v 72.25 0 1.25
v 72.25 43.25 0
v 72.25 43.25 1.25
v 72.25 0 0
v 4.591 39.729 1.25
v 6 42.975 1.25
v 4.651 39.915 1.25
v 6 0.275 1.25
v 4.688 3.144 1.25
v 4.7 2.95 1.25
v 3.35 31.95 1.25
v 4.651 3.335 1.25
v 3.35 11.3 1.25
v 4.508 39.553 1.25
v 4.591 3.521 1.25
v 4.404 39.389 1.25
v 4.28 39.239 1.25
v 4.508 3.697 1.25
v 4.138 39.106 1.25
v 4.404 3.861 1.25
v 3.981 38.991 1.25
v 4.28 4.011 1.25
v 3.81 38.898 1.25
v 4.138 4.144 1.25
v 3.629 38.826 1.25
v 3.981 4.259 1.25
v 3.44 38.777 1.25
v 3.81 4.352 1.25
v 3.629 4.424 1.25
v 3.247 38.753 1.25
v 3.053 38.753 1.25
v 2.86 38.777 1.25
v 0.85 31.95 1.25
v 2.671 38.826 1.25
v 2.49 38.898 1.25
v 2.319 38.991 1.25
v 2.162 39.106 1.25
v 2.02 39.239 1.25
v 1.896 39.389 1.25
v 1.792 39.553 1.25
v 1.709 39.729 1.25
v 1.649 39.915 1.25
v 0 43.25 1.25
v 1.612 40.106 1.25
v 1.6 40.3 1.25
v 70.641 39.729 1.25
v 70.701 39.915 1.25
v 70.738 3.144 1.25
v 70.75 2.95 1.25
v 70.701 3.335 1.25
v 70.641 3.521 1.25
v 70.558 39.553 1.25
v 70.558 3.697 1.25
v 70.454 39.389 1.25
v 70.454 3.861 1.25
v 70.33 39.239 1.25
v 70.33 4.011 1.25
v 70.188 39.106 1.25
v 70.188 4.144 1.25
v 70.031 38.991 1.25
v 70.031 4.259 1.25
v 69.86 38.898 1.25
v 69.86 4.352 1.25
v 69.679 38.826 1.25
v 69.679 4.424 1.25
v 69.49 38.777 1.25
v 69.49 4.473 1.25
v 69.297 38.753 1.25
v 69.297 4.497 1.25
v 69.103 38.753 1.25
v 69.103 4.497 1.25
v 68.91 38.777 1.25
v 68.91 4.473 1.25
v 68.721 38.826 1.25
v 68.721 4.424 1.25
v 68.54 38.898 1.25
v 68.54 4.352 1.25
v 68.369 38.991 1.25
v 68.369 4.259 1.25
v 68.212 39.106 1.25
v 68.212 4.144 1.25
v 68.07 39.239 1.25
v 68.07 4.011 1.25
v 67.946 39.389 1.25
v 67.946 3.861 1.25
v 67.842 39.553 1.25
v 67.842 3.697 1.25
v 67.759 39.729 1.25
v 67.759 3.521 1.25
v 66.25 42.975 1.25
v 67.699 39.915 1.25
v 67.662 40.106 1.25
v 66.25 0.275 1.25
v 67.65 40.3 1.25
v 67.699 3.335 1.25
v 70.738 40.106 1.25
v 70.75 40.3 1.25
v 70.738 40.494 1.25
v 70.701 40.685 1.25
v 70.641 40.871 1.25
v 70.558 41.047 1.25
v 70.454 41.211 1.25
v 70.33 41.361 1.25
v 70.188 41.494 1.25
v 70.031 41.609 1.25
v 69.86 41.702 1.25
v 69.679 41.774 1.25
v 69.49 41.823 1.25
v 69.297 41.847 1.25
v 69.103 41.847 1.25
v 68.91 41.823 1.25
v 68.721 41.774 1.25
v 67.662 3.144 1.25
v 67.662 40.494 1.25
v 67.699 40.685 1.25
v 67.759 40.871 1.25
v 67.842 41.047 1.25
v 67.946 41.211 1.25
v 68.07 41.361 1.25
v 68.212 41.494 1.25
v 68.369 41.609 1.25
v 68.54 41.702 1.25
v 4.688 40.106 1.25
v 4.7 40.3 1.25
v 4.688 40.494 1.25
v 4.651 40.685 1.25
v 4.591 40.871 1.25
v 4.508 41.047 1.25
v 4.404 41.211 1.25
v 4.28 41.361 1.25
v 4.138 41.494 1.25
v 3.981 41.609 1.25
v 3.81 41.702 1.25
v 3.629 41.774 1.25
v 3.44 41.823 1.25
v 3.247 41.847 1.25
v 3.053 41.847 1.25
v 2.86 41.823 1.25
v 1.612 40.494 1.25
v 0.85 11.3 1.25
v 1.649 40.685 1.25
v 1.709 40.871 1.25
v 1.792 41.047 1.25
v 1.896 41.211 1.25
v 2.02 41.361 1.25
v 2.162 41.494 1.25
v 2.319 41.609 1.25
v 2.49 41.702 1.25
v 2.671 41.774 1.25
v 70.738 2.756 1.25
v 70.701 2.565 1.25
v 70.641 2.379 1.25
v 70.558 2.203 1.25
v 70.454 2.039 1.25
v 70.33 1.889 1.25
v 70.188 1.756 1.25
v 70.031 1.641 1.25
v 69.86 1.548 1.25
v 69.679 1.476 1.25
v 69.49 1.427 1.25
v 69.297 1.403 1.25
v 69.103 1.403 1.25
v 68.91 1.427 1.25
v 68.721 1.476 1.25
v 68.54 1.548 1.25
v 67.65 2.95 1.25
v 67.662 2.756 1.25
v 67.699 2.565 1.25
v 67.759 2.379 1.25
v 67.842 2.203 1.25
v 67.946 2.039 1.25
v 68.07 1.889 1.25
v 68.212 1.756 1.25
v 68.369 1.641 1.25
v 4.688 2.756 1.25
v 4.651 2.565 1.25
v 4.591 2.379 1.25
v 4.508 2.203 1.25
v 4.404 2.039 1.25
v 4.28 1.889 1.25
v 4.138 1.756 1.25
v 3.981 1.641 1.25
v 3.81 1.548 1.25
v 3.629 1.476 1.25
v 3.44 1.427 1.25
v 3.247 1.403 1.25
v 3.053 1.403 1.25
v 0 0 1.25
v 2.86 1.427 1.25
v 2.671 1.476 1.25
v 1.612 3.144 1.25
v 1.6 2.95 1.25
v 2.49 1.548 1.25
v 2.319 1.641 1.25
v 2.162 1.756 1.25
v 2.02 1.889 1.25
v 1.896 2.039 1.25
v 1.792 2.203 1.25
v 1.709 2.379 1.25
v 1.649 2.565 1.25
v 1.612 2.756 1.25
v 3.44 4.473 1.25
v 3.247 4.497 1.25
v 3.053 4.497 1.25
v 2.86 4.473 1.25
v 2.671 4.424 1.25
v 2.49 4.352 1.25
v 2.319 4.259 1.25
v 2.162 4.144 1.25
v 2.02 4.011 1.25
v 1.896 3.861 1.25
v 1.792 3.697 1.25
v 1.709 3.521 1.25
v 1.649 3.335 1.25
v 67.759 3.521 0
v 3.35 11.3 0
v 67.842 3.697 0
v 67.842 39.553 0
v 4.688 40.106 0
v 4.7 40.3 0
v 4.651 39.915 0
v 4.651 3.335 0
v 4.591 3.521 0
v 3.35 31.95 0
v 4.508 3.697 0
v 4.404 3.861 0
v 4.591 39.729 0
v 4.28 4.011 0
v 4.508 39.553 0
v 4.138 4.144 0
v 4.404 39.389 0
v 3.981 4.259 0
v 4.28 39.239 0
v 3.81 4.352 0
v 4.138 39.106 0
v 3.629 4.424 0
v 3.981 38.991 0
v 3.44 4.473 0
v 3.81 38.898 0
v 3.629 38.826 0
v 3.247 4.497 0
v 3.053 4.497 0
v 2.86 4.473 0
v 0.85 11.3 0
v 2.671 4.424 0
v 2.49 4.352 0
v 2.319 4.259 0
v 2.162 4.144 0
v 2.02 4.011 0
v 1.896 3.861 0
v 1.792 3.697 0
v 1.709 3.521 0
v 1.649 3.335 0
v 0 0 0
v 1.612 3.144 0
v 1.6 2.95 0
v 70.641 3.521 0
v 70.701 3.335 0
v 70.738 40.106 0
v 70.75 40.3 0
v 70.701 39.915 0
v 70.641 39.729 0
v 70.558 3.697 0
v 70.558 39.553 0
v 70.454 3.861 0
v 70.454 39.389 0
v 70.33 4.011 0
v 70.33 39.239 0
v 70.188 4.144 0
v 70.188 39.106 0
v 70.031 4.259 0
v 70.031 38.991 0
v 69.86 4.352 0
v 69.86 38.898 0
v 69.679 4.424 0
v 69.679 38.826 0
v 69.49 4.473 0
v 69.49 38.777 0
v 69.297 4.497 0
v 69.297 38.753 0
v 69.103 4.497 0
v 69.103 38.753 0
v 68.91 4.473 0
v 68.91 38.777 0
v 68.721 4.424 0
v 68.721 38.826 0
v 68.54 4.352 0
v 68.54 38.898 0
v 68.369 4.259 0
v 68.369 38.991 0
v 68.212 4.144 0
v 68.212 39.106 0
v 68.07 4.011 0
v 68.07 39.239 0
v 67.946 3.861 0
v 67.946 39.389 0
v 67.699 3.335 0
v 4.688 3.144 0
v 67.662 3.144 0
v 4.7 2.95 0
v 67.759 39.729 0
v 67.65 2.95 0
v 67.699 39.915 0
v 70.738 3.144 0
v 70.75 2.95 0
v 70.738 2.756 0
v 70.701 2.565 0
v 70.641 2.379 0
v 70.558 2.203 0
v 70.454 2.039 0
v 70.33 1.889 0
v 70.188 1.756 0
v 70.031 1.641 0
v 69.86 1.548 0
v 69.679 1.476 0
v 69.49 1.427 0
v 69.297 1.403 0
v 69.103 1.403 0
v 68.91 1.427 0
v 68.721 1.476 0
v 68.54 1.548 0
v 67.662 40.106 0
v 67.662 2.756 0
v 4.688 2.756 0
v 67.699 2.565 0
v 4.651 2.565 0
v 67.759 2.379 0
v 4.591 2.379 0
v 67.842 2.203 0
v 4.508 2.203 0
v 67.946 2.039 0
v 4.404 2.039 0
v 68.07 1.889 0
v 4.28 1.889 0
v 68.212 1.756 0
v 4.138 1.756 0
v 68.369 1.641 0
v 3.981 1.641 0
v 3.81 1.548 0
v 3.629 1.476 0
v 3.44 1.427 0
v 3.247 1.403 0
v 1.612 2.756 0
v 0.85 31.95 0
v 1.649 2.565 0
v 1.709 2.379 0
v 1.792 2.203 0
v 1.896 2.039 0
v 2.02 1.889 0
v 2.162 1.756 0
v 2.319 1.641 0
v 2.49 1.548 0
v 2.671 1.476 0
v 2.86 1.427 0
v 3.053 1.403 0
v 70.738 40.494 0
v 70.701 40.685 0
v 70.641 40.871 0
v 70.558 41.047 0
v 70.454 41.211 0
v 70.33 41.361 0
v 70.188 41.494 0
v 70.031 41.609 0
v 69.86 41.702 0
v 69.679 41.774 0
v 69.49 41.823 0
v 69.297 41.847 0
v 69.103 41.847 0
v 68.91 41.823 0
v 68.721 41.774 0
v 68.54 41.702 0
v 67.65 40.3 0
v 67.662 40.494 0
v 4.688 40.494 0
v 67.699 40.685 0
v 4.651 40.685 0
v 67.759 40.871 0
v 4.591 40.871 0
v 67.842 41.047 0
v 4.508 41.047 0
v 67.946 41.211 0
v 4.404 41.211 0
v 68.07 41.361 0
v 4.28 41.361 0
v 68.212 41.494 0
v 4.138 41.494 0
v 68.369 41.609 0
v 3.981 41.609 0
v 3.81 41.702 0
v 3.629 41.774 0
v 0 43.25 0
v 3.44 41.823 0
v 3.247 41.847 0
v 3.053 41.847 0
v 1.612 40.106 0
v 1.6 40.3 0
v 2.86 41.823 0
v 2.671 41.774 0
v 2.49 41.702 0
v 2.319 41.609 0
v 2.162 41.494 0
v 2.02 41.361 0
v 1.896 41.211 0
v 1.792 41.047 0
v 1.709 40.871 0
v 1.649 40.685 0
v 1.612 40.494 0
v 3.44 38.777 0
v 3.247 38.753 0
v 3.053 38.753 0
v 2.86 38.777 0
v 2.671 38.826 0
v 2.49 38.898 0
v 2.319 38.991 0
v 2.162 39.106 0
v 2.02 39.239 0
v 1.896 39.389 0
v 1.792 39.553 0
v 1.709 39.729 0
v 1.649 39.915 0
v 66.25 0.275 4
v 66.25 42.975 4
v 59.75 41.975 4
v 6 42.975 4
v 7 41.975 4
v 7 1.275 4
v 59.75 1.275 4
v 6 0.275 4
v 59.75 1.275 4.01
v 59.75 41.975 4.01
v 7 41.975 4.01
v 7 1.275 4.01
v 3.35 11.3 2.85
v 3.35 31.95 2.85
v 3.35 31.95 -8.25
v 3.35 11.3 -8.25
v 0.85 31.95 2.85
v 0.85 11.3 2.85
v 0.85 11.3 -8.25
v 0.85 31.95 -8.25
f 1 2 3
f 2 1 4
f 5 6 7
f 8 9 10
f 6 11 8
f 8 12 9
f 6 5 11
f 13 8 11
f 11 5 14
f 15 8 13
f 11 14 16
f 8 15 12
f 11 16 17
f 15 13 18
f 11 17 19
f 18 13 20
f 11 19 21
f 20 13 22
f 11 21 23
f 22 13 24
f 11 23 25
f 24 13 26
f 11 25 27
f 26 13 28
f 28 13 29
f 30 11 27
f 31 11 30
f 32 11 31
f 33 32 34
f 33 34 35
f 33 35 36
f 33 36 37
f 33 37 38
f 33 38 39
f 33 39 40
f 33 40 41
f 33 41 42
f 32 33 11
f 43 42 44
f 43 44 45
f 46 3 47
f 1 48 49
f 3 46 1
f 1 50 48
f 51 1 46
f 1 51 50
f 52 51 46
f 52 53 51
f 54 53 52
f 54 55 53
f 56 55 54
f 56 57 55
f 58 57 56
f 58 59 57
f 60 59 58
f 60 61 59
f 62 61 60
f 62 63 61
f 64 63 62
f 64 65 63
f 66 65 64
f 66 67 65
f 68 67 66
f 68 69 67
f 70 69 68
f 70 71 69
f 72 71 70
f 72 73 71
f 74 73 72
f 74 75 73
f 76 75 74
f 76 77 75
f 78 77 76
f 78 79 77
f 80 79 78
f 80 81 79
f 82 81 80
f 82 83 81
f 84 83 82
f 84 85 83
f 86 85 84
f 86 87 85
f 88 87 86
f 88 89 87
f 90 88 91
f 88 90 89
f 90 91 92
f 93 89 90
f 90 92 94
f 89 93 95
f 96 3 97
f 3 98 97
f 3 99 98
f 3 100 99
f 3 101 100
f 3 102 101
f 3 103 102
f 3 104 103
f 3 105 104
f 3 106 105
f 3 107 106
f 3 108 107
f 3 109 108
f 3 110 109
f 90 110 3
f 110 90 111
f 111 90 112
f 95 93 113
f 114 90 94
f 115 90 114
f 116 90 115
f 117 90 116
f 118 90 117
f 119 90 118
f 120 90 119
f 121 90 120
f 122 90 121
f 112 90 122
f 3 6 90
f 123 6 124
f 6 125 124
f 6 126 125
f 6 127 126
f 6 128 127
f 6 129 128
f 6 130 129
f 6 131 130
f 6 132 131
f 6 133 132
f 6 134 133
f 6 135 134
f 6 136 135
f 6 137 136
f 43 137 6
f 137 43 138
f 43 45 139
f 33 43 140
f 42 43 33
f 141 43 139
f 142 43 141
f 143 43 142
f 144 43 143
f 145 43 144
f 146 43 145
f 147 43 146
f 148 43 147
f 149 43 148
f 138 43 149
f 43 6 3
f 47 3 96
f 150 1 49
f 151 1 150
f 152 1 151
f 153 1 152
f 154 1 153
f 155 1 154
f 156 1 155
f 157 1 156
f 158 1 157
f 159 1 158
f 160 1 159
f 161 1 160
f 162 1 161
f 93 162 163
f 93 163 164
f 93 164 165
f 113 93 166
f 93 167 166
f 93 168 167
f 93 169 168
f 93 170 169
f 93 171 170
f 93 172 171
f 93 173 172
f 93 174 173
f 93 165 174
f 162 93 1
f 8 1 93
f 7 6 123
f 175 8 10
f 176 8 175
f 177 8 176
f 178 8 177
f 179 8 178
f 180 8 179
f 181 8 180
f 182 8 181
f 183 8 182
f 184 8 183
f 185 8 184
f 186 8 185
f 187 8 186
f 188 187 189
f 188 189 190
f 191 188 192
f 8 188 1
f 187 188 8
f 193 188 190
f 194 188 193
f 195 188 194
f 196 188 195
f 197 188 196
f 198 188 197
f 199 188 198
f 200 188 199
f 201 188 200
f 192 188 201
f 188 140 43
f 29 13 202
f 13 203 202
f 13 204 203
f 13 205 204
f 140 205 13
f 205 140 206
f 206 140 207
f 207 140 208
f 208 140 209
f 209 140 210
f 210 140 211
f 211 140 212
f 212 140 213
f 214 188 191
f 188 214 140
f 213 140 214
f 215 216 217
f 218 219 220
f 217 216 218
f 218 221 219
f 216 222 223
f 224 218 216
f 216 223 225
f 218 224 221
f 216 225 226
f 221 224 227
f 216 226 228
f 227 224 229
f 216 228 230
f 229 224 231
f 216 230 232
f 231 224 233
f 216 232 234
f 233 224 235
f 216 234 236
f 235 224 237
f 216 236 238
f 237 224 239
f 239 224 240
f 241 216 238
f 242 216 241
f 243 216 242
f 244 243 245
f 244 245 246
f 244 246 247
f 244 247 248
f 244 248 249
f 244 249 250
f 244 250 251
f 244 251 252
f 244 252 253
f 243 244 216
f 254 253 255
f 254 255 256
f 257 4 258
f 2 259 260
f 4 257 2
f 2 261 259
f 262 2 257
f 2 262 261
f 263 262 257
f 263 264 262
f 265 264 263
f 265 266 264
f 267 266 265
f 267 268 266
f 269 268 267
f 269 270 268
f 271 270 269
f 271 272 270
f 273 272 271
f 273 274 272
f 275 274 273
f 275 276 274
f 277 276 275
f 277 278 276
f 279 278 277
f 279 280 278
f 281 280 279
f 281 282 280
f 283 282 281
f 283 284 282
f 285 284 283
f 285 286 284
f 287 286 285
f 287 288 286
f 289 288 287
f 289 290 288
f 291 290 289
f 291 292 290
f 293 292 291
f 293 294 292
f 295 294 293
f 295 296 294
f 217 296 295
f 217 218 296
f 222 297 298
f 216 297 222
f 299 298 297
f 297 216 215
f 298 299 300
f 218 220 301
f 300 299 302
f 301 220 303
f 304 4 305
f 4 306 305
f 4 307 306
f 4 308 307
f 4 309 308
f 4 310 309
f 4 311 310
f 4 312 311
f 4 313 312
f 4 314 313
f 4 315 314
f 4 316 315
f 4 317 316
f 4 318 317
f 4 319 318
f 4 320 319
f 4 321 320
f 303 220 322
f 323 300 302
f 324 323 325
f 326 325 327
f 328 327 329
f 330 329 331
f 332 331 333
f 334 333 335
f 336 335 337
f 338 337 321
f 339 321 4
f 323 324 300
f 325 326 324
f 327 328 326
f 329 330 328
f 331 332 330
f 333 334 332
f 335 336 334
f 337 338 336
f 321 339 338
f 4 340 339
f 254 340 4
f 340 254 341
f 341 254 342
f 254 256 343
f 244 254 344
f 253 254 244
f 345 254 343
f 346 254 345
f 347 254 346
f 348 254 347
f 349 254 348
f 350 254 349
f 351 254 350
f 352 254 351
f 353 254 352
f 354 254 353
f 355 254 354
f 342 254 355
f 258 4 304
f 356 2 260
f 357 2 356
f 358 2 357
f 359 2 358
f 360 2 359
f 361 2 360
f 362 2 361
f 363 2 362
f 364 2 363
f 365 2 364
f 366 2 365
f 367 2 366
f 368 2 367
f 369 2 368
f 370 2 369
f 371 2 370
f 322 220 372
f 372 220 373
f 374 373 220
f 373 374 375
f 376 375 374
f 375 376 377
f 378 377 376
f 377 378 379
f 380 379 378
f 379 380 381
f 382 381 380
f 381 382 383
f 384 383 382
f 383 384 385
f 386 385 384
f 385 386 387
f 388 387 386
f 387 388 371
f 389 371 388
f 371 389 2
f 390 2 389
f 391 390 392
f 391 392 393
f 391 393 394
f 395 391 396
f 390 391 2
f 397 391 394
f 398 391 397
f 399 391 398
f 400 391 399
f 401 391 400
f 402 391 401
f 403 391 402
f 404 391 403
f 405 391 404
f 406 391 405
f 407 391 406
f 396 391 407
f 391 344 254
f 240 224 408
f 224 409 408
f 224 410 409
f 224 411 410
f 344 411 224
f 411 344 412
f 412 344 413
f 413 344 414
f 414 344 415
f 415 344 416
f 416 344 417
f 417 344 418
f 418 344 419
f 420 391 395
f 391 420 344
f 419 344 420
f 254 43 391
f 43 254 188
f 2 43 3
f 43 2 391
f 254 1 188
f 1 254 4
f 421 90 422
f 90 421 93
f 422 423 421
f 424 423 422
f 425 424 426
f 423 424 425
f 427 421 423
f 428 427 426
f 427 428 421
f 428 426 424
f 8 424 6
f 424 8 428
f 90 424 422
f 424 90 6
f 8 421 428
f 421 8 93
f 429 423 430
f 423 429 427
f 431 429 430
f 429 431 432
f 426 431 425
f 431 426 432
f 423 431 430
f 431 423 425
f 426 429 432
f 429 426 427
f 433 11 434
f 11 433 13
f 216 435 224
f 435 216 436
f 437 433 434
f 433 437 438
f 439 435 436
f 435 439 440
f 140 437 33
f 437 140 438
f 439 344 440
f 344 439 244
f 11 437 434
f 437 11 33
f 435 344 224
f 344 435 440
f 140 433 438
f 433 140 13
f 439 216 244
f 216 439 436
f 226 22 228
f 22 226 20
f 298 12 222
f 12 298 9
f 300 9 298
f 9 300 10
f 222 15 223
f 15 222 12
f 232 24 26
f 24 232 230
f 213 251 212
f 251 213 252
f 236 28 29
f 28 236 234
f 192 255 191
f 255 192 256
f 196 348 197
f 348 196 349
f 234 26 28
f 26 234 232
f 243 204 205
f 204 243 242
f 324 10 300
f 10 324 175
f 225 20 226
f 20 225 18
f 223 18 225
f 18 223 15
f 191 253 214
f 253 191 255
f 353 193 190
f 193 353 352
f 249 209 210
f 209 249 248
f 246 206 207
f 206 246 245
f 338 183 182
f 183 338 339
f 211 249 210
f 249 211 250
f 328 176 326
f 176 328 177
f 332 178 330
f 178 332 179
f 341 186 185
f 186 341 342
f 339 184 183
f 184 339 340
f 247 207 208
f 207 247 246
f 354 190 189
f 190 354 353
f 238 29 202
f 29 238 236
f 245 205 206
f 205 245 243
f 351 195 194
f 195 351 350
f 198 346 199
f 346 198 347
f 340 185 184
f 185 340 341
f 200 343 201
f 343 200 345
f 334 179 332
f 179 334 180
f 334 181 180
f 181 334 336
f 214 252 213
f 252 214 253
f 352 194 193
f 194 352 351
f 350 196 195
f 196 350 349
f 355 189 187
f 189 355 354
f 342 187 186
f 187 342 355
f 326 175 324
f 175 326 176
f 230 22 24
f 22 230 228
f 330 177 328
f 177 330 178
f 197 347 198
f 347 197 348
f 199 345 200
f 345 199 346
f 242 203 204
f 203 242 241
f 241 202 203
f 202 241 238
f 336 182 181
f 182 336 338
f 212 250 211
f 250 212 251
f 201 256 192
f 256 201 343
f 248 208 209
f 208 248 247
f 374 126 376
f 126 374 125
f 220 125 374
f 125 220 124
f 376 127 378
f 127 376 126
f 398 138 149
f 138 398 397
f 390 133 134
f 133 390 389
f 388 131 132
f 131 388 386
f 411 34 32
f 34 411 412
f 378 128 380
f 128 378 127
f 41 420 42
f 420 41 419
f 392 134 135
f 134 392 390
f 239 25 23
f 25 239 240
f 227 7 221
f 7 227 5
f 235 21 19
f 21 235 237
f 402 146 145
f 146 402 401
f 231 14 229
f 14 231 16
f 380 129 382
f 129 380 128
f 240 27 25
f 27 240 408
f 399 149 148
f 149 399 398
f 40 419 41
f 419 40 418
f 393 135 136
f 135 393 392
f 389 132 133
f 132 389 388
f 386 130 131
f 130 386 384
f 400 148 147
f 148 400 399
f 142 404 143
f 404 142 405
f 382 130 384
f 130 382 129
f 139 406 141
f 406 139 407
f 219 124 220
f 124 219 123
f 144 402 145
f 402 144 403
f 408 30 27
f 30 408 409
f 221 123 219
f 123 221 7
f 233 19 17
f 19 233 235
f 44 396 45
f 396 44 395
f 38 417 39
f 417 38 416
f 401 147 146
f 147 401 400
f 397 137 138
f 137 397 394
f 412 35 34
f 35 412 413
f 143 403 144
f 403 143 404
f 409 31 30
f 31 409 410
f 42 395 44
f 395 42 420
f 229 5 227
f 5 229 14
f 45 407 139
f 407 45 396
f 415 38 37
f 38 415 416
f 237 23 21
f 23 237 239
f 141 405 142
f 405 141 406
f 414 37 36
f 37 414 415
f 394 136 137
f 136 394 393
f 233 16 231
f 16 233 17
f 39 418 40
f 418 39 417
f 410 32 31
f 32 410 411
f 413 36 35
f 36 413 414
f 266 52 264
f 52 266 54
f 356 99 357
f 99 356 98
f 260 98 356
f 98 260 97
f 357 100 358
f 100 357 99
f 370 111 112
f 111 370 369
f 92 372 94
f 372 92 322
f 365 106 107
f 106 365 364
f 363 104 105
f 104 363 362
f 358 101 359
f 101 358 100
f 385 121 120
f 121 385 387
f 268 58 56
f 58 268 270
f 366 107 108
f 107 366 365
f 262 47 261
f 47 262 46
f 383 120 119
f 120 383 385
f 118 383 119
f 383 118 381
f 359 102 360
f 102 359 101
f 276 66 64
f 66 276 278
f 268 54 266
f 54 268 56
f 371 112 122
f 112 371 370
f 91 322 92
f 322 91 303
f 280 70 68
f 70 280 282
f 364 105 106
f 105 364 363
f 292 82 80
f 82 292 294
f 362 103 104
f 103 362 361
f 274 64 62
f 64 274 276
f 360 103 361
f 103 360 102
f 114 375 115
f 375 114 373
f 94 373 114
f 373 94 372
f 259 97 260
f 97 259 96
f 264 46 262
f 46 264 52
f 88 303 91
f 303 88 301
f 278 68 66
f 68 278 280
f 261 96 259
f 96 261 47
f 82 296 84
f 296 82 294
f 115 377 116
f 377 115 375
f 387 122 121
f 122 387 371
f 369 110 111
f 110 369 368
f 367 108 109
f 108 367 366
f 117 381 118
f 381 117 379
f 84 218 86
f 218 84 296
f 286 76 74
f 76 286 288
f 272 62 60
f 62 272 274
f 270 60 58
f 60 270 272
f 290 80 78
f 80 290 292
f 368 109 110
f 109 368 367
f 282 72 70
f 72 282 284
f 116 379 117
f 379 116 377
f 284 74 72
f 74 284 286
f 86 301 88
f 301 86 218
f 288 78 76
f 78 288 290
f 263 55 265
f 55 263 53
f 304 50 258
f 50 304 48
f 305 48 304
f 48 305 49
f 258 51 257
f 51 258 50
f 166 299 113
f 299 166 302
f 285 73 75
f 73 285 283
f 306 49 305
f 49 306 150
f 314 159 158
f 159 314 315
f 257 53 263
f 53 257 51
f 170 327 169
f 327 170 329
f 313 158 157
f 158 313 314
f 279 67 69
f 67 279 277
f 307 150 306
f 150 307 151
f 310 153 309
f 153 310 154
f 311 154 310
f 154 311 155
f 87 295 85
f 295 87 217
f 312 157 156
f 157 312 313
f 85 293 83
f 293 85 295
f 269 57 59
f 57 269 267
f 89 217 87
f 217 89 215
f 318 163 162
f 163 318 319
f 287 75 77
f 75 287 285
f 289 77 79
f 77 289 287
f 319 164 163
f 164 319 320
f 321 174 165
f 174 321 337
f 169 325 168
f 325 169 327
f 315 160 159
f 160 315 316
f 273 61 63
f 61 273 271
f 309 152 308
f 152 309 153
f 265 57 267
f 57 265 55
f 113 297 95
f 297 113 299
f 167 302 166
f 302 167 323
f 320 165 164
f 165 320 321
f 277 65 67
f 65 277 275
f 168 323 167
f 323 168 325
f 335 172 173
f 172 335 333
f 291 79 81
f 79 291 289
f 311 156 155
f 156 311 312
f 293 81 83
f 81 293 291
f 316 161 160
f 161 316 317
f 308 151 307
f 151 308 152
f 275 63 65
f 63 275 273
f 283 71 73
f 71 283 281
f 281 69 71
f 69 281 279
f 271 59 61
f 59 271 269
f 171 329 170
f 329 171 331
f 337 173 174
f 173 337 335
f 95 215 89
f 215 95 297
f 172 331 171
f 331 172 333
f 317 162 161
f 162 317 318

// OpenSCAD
module screen($fn = $fn) {

    electronic_board_x_size = 72.25;
    electronic_board_y_size = 43.25;
    electronic_board_z_size = 1.25;

    screen_external_x_size = 60.25;
    screen_external_y_size = 42.7;
    screen_external_z_size = 4 - 1.25;

    throw_diameter = 3.1;

    x_margin_left = 1.6 + 1.55;
    x_margin_right = 1.5 + 1.55;
    y_margin_top = 1.55 + 1.55;
    y_margin_bottom = 1.4 + 1.55;

    difference() {
        union() {
            color("RoyalBlue")
                cube(
                    [
                        electronic_board_x_size,
                        electronic_board_y_size,
                        electronic_board_z_size,
                    ]
                );

            translate([
                (electronic_board_x_size - screen_external_x_size) / 2,
                (electronic_board_y_size - screen_external_y_size) / 2,
                electronic_board_z_size
            ])
            color("white")
                cube(
                    [
                        screen_external_x_size,
                        screen_external_y_size,
                        screen_external_z_size,
                    ]
                );


            translate([
                (electronic_board_x_size - screen_external_x_size) / 2 + 1,
                (electronic_board_y_size - screen_external_y_size) / 2 + 1,
                electronic_board_z_size + 0.01
            ])
            color("black")
                cube(
                    [
                        screen_external_x_size - 1 - 6.5,
                        screen_external_y_size - 1 - 1,
                        screen_external_z_size,
                    ]
                );

            translate([0.85, 11.3, -8.25])
            cube([
                2.5,
                electronic_board_y_size - (11.3 * 2),
                8.25 + electronic_board_z_size + 1.6
            ]);
        }

        translate([x_margin_left, y_margin_bottom, - electronic_board_z_size / 2])
            cylinder(h = electronic_board_z_size * 2, d = throw_diameter, $fn = $fn);

        translate([x_margin_left, electronic_board_y_size - y_margin_bottom, - electronic_board_z_size / 2])
            cylinder(h = electronic_board_z_size * 2, d = throw_diameter, $fn = $fn);

        translate([electronic_board_x_size - x_margin_right, electronic_board_y_size - y_margin_bottom, - electronic_board_z_size / 2])
            cylinder(h = electronic_board_z_size * 2, d = throw_diameter, $fn = $fn);

        translate([electronic_board_x_size - x_margin_right, y_margin_bottom, - electronic_board_z_size / 2])
            cylinder(h = electronic_board_z_size * 2, d = throw_diameter, $fn = $fn);

    }
}

screen($fn = 50);
